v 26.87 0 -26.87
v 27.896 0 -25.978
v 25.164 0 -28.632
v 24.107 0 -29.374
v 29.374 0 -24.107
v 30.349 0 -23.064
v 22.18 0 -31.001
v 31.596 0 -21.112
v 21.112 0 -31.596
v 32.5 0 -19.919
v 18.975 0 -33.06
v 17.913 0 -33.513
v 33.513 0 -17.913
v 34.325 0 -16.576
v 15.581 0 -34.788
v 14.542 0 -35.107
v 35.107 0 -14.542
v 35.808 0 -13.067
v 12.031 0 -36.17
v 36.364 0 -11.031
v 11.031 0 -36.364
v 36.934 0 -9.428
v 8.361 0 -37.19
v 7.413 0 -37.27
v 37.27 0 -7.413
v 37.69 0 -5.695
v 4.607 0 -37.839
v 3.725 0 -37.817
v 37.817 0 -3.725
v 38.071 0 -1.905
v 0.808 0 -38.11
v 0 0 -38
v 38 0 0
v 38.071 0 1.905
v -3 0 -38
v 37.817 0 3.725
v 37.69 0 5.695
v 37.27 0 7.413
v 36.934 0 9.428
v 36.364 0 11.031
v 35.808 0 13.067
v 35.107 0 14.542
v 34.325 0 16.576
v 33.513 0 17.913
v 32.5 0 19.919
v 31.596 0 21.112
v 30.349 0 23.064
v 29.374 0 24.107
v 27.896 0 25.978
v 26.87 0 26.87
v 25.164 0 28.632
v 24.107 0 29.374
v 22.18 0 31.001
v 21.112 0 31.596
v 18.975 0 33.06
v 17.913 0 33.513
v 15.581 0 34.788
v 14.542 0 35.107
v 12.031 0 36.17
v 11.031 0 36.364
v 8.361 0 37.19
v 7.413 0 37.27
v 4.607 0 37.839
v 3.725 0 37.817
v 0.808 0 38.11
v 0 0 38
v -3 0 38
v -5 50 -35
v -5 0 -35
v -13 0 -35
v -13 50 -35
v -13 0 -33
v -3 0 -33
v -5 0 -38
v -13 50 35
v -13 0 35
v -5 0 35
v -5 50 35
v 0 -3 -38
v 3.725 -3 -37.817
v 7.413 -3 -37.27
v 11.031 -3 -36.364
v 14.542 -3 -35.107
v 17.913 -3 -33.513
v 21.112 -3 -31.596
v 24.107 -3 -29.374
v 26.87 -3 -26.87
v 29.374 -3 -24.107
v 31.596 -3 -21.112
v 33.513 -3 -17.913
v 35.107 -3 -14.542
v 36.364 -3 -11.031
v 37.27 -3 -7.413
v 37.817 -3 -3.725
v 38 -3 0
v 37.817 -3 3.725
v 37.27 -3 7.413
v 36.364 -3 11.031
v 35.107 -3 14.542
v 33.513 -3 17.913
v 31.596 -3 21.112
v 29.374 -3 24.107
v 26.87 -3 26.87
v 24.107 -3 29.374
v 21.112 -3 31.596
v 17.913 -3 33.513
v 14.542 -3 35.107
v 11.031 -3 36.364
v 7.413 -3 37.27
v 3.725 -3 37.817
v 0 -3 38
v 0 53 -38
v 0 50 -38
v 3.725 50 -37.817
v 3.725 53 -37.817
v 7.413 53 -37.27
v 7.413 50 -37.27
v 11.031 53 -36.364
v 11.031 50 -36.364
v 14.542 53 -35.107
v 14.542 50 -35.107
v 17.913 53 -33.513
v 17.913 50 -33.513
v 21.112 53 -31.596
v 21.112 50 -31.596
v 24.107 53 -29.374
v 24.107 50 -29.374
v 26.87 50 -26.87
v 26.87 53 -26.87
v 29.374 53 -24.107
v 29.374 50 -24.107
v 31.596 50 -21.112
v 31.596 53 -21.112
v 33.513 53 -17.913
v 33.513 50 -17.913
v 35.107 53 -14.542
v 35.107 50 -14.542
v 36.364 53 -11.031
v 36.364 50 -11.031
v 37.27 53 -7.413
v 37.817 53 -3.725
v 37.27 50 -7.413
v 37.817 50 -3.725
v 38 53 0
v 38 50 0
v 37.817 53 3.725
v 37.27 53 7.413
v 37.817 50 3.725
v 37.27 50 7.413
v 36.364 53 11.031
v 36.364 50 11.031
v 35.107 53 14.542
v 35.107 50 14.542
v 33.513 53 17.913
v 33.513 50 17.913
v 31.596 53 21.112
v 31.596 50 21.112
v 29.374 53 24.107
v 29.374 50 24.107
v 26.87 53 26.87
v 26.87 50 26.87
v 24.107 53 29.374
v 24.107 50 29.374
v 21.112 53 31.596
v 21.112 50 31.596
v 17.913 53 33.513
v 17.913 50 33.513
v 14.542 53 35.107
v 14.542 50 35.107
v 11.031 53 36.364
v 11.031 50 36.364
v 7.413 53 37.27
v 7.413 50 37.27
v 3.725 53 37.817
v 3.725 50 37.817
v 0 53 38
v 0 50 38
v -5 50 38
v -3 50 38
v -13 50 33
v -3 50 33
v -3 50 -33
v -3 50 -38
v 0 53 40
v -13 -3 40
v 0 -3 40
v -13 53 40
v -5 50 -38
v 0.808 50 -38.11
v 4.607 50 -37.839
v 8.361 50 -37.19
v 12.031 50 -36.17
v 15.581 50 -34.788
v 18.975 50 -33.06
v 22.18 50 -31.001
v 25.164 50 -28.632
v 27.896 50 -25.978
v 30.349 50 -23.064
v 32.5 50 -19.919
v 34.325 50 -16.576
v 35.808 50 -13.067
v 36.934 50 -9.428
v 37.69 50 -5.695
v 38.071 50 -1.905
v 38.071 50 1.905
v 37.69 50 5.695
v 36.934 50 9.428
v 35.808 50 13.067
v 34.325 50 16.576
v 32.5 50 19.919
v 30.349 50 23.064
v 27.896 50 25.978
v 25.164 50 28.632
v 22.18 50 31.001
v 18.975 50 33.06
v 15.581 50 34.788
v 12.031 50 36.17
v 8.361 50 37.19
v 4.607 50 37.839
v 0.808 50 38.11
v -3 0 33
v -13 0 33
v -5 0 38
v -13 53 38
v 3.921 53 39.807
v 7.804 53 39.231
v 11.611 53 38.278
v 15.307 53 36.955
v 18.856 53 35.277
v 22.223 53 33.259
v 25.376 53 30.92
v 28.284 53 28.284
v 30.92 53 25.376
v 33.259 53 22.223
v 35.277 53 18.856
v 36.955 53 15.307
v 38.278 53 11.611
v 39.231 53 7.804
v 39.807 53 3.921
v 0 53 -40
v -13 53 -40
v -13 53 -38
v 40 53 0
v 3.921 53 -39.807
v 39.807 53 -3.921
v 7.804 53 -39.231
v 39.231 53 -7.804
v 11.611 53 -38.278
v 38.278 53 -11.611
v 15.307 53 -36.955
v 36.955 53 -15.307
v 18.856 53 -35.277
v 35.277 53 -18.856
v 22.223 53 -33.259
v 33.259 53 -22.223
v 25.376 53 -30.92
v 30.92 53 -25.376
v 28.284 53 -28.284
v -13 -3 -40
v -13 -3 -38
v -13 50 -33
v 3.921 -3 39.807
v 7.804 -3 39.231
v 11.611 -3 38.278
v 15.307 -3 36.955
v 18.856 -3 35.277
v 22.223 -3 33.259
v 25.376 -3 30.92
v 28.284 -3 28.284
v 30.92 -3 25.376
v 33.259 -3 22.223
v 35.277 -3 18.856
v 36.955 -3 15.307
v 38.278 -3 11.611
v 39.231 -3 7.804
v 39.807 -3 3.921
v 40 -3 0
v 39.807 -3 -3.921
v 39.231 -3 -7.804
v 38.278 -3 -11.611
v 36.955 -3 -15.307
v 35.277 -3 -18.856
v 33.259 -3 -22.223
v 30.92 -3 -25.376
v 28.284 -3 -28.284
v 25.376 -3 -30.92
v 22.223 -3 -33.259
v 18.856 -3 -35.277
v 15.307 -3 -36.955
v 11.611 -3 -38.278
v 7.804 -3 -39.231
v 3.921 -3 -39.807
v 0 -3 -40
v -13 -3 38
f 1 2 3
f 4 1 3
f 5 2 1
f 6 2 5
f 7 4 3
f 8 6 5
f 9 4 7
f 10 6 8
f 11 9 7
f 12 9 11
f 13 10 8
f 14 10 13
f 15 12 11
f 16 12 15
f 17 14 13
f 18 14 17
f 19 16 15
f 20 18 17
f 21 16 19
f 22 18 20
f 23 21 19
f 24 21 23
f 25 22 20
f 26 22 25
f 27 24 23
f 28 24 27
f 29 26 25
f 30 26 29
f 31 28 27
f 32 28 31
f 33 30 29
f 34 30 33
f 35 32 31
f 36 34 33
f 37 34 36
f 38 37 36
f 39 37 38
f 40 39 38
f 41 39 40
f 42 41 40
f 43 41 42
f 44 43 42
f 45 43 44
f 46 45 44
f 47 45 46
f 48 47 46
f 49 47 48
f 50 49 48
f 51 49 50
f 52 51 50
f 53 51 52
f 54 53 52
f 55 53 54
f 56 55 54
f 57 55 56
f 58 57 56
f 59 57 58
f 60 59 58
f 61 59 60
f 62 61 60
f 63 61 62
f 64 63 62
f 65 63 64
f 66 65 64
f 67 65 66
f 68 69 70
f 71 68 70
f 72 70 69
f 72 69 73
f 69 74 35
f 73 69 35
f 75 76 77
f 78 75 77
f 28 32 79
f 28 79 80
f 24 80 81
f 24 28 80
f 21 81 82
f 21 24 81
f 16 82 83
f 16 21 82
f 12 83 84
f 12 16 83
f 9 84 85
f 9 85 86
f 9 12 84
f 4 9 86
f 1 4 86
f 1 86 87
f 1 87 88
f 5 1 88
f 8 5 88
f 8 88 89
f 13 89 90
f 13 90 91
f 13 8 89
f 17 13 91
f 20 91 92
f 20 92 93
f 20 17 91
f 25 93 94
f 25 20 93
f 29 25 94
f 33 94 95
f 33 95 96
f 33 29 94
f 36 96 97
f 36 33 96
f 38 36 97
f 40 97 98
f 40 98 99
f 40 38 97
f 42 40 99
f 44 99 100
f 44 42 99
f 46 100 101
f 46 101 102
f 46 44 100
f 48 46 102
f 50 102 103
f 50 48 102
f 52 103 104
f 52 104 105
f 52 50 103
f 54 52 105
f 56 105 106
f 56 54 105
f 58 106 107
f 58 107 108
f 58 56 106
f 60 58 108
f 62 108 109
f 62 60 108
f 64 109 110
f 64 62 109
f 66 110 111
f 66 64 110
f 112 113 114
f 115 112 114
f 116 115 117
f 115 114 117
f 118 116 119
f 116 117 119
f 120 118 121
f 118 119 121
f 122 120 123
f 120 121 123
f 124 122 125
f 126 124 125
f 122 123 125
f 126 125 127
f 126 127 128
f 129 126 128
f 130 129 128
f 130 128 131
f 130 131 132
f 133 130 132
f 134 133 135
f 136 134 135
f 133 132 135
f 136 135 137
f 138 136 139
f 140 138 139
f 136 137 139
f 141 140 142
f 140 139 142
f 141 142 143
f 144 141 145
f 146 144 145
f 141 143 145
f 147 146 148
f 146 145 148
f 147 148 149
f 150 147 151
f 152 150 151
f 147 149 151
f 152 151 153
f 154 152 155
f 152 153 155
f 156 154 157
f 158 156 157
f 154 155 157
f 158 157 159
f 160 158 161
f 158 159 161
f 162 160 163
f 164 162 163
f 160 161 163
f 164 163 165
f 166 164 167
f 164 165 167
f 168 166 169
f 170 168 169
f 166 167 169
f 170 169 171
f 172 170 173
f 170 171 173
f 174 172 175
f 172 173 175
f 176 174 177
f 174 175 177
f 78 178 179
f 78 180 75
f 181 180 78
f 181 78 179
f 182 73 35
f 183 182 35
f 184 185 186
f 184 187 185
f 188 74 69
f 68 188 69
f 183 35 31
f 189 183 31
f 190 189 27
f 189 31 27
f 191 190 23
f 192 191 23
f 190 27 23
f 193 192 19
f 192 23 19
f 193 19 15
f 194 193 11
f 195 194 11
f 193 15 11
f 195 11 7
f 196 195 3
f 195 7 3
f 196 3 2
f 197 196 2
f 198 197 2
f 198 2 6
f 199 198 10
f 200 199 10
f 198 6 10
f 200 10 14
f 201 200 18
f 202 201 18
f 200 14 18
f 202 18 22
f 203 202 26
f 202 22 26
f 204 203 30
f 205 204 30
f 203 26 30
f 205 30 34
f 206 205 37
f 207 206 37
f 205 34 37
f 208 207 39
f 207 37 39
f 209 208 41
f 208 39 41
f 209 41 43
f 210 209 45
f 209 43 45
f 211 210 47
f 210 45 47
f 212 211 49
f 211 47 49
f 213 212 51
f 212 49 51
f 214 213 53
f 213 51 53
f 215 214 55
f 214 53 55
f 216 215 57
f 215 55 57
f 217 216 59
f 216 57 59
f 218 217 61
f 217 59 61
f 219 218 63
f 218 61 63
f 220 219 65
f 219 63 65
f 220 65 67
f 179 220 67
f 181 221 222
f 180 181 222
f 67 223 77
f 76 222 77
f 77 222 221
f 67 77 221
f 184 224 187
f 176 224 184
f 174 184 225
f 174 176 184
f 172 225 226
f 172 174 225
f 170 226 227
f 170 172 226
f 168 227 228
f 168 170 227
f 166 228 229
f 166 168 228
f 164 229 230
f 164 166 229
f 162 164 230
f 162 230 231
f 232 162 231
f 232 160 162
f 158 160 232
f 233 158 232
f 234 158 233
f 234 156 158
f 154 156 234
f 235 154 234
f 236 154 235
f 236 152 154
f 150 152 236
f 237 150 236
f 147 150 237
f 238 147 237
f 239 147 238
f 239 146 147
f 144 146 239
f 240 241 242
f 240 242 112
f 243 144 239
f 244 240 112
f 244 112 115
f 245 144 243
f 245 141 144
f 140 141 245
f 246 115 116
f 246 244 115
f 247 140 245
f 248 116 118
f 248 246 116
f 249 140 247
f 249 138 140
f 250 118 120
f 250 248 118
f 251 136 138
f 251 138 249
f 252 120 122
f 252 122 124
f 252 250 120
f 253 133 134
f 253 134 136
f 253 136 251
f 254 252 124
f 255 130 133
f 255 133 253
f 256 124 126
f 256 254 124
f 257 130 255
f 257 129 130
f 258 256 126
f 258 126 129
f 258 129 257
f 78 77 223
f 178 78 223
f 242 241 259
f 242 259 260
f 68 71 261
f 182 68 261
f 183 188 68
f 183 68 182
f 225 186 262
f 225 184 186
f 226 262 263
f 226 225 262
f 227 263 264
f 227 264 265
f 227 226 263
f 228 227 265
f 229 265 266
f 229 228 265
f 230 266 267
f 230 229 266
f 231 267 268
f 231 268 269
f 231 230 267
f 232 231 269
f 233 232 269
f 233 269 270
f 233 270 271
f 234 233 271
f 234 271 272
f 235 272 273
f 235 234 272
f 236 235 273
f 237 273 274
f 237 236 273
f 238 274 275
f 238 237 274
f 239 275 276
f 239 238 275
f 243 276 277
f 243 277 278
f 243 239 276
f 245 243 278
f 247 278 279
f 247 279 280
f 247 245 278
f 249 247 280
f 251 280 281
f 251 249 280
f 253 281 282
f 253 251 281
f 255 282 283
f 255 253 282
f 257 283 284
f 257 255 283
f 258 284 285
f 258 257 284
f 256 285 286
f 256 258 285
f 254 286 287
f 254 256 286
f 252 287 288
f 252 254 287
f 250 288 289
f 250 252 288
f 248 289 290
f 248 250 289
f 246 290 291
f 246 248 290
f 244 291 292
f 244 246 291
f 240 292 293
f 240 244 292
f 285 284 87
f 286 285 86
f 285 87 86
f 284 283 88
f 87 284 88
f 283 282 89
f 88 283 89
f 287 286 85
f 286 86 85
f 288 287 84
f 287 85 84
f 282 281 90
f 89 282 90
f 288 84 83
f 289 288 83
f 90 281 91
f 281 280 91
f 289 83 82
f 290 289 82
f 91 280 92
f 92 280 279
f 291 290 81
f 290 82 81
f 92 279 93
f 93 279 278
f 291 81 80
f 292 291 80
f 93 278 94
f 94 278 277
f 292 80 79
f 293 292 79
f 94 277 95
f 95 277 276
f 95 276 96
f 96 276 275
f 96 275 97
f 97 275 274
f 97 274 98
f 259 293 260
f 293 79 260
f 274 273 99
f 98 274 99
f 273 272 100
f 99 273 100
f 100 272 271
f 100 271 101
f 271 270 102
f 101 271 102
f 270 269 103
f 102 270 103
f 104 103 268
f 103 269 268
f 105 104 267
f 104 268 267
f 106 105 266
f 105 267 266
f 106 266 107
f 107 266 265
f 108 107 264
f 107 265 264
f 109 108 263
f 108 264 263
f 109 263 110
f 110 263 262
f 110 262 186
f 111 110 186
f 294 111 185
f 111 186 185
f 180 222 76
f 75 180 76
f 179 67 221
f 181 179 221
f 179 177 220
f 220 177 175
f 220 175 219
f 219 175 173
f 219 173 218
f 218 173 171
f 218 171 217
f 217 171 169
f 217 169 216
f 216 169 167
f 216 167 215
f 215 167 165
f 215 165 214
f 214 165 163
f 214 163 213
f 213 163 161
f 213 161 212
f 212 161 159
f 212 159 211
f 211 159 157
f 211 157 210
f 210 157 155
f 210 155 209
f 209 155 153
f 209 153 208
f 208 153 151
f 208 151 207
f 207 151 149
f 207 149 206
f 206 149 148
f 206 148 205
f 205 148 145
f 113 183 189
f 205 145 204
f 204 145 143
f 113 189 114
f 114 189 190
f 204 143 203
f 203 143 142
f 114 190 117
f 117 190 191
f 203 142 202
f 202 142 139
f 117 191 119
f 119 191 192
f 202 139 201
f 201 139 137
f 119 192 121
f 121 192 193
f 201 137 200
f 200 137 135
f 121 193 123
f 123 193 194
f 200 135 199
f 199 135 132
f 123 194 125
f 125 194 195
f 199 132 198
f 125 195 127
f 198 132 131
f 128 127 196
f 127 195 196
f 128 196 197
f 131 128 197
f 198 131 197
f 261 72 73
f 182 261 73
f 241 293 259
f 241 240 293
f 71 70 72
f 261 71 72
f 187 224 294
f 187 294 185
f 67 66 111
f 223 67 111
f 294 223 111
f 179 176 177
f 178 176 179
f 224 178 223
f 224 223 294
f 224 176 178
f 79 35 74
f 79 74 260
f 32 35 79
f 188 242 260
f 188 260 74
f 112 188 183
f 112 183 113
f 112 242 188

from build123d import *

# Parameters (mm, degrees)
BOSS_EXTRUDE1_DEPTH = 50
BOSS_EXTRUDE2_DEPTH = 3
BOSS_EXTRUDE3_DEPTH = 3


with BuildPart() as part:
    # Sketch6 → Boss-Extrude1 (new body)
    with BuildSketch(Plane(origin=(0, 0, 0), x_dir=(1, 0, 0), z_dir=(0, 1, 0))):
        with BuildLine():
            Line((0, 40), (-13, 40))
            Line((-13, 40), (-13, 38))
            Line((-13, 38), (-5, 38))
            Line((-5, 38), (-5, 35))
            Line((-5, 35), (-13, 35))
            Line((-13, 35), (-13, 33))
            Line((-13, 33), (-3, 33))
            Line((-3, 33), (-3, 38))
            ThreePointArc((-3, 38), (38.118237105, 0), (-3, -38))
            Line((-3, -38), (-3, -33))
            Line((-3, -33), (-13, -33))
            Line((-13, -33), (-13, -35))
            Line((-13, -35), (-5, -35))
            Line((-5, -35), (-5, -38))
            Line((-5, -38), (-13, -38))
            Line((-13, -38), (-13, -40))
            Line((-13, -40), (0, -40))
            ThreePointArc((0, -40), (40, 0), (0, 40))
        make_face()
    extrude(amount=BOSS_EXTRUDE1_DEPTH)

    # Sketch7 → Boss-Extrude2 (add)
    with BuildSketch(Plane(origin=(0, 50, 0), x_dir=(1, 0, 0), z_dir=(0, 1, 0))):
        with BuildLine():
            Line((0, -38), (-13, -38))
            Line((-13, -38), (-13, -40))
            Line((-13, -40), (0, -40))
            ThreePointArc((0, -40), (40, 0), (0, 40))
            Line((0, 40), (-13, 40))
            Line((-13, 40), (-13, 38))
            Line((-13, 38), (0, 38))
            ThreePointArc((0, 38), (38, 0), (0, -38))
        make_face()
    extrude(amount=BOSS_EXTRUDE2_DEPTH)

    # Sketch8 → Boss-Extrude3 (add)
    with BuildSketch(Plane.XZ):
        with BuildLine():
            Line((0, -40), (-13, -40))
            Line((-13, -40), (-13, -38))
            Line((-13, -38), (0, -38))
            ThreePointArc((0, -38), (38, 0), (0, 38))
            Line((0, 38), (-13, 38))
            Line((-13, 38), (-13, 40))
            Line((-13, 40), (0, 40))
            ThreePointArc((0, 40), (40, 0), (0, -40))
        make_face()
    extrude(amount=BOSS_EXTRUDE3_DEPTH)


solid = part.part
